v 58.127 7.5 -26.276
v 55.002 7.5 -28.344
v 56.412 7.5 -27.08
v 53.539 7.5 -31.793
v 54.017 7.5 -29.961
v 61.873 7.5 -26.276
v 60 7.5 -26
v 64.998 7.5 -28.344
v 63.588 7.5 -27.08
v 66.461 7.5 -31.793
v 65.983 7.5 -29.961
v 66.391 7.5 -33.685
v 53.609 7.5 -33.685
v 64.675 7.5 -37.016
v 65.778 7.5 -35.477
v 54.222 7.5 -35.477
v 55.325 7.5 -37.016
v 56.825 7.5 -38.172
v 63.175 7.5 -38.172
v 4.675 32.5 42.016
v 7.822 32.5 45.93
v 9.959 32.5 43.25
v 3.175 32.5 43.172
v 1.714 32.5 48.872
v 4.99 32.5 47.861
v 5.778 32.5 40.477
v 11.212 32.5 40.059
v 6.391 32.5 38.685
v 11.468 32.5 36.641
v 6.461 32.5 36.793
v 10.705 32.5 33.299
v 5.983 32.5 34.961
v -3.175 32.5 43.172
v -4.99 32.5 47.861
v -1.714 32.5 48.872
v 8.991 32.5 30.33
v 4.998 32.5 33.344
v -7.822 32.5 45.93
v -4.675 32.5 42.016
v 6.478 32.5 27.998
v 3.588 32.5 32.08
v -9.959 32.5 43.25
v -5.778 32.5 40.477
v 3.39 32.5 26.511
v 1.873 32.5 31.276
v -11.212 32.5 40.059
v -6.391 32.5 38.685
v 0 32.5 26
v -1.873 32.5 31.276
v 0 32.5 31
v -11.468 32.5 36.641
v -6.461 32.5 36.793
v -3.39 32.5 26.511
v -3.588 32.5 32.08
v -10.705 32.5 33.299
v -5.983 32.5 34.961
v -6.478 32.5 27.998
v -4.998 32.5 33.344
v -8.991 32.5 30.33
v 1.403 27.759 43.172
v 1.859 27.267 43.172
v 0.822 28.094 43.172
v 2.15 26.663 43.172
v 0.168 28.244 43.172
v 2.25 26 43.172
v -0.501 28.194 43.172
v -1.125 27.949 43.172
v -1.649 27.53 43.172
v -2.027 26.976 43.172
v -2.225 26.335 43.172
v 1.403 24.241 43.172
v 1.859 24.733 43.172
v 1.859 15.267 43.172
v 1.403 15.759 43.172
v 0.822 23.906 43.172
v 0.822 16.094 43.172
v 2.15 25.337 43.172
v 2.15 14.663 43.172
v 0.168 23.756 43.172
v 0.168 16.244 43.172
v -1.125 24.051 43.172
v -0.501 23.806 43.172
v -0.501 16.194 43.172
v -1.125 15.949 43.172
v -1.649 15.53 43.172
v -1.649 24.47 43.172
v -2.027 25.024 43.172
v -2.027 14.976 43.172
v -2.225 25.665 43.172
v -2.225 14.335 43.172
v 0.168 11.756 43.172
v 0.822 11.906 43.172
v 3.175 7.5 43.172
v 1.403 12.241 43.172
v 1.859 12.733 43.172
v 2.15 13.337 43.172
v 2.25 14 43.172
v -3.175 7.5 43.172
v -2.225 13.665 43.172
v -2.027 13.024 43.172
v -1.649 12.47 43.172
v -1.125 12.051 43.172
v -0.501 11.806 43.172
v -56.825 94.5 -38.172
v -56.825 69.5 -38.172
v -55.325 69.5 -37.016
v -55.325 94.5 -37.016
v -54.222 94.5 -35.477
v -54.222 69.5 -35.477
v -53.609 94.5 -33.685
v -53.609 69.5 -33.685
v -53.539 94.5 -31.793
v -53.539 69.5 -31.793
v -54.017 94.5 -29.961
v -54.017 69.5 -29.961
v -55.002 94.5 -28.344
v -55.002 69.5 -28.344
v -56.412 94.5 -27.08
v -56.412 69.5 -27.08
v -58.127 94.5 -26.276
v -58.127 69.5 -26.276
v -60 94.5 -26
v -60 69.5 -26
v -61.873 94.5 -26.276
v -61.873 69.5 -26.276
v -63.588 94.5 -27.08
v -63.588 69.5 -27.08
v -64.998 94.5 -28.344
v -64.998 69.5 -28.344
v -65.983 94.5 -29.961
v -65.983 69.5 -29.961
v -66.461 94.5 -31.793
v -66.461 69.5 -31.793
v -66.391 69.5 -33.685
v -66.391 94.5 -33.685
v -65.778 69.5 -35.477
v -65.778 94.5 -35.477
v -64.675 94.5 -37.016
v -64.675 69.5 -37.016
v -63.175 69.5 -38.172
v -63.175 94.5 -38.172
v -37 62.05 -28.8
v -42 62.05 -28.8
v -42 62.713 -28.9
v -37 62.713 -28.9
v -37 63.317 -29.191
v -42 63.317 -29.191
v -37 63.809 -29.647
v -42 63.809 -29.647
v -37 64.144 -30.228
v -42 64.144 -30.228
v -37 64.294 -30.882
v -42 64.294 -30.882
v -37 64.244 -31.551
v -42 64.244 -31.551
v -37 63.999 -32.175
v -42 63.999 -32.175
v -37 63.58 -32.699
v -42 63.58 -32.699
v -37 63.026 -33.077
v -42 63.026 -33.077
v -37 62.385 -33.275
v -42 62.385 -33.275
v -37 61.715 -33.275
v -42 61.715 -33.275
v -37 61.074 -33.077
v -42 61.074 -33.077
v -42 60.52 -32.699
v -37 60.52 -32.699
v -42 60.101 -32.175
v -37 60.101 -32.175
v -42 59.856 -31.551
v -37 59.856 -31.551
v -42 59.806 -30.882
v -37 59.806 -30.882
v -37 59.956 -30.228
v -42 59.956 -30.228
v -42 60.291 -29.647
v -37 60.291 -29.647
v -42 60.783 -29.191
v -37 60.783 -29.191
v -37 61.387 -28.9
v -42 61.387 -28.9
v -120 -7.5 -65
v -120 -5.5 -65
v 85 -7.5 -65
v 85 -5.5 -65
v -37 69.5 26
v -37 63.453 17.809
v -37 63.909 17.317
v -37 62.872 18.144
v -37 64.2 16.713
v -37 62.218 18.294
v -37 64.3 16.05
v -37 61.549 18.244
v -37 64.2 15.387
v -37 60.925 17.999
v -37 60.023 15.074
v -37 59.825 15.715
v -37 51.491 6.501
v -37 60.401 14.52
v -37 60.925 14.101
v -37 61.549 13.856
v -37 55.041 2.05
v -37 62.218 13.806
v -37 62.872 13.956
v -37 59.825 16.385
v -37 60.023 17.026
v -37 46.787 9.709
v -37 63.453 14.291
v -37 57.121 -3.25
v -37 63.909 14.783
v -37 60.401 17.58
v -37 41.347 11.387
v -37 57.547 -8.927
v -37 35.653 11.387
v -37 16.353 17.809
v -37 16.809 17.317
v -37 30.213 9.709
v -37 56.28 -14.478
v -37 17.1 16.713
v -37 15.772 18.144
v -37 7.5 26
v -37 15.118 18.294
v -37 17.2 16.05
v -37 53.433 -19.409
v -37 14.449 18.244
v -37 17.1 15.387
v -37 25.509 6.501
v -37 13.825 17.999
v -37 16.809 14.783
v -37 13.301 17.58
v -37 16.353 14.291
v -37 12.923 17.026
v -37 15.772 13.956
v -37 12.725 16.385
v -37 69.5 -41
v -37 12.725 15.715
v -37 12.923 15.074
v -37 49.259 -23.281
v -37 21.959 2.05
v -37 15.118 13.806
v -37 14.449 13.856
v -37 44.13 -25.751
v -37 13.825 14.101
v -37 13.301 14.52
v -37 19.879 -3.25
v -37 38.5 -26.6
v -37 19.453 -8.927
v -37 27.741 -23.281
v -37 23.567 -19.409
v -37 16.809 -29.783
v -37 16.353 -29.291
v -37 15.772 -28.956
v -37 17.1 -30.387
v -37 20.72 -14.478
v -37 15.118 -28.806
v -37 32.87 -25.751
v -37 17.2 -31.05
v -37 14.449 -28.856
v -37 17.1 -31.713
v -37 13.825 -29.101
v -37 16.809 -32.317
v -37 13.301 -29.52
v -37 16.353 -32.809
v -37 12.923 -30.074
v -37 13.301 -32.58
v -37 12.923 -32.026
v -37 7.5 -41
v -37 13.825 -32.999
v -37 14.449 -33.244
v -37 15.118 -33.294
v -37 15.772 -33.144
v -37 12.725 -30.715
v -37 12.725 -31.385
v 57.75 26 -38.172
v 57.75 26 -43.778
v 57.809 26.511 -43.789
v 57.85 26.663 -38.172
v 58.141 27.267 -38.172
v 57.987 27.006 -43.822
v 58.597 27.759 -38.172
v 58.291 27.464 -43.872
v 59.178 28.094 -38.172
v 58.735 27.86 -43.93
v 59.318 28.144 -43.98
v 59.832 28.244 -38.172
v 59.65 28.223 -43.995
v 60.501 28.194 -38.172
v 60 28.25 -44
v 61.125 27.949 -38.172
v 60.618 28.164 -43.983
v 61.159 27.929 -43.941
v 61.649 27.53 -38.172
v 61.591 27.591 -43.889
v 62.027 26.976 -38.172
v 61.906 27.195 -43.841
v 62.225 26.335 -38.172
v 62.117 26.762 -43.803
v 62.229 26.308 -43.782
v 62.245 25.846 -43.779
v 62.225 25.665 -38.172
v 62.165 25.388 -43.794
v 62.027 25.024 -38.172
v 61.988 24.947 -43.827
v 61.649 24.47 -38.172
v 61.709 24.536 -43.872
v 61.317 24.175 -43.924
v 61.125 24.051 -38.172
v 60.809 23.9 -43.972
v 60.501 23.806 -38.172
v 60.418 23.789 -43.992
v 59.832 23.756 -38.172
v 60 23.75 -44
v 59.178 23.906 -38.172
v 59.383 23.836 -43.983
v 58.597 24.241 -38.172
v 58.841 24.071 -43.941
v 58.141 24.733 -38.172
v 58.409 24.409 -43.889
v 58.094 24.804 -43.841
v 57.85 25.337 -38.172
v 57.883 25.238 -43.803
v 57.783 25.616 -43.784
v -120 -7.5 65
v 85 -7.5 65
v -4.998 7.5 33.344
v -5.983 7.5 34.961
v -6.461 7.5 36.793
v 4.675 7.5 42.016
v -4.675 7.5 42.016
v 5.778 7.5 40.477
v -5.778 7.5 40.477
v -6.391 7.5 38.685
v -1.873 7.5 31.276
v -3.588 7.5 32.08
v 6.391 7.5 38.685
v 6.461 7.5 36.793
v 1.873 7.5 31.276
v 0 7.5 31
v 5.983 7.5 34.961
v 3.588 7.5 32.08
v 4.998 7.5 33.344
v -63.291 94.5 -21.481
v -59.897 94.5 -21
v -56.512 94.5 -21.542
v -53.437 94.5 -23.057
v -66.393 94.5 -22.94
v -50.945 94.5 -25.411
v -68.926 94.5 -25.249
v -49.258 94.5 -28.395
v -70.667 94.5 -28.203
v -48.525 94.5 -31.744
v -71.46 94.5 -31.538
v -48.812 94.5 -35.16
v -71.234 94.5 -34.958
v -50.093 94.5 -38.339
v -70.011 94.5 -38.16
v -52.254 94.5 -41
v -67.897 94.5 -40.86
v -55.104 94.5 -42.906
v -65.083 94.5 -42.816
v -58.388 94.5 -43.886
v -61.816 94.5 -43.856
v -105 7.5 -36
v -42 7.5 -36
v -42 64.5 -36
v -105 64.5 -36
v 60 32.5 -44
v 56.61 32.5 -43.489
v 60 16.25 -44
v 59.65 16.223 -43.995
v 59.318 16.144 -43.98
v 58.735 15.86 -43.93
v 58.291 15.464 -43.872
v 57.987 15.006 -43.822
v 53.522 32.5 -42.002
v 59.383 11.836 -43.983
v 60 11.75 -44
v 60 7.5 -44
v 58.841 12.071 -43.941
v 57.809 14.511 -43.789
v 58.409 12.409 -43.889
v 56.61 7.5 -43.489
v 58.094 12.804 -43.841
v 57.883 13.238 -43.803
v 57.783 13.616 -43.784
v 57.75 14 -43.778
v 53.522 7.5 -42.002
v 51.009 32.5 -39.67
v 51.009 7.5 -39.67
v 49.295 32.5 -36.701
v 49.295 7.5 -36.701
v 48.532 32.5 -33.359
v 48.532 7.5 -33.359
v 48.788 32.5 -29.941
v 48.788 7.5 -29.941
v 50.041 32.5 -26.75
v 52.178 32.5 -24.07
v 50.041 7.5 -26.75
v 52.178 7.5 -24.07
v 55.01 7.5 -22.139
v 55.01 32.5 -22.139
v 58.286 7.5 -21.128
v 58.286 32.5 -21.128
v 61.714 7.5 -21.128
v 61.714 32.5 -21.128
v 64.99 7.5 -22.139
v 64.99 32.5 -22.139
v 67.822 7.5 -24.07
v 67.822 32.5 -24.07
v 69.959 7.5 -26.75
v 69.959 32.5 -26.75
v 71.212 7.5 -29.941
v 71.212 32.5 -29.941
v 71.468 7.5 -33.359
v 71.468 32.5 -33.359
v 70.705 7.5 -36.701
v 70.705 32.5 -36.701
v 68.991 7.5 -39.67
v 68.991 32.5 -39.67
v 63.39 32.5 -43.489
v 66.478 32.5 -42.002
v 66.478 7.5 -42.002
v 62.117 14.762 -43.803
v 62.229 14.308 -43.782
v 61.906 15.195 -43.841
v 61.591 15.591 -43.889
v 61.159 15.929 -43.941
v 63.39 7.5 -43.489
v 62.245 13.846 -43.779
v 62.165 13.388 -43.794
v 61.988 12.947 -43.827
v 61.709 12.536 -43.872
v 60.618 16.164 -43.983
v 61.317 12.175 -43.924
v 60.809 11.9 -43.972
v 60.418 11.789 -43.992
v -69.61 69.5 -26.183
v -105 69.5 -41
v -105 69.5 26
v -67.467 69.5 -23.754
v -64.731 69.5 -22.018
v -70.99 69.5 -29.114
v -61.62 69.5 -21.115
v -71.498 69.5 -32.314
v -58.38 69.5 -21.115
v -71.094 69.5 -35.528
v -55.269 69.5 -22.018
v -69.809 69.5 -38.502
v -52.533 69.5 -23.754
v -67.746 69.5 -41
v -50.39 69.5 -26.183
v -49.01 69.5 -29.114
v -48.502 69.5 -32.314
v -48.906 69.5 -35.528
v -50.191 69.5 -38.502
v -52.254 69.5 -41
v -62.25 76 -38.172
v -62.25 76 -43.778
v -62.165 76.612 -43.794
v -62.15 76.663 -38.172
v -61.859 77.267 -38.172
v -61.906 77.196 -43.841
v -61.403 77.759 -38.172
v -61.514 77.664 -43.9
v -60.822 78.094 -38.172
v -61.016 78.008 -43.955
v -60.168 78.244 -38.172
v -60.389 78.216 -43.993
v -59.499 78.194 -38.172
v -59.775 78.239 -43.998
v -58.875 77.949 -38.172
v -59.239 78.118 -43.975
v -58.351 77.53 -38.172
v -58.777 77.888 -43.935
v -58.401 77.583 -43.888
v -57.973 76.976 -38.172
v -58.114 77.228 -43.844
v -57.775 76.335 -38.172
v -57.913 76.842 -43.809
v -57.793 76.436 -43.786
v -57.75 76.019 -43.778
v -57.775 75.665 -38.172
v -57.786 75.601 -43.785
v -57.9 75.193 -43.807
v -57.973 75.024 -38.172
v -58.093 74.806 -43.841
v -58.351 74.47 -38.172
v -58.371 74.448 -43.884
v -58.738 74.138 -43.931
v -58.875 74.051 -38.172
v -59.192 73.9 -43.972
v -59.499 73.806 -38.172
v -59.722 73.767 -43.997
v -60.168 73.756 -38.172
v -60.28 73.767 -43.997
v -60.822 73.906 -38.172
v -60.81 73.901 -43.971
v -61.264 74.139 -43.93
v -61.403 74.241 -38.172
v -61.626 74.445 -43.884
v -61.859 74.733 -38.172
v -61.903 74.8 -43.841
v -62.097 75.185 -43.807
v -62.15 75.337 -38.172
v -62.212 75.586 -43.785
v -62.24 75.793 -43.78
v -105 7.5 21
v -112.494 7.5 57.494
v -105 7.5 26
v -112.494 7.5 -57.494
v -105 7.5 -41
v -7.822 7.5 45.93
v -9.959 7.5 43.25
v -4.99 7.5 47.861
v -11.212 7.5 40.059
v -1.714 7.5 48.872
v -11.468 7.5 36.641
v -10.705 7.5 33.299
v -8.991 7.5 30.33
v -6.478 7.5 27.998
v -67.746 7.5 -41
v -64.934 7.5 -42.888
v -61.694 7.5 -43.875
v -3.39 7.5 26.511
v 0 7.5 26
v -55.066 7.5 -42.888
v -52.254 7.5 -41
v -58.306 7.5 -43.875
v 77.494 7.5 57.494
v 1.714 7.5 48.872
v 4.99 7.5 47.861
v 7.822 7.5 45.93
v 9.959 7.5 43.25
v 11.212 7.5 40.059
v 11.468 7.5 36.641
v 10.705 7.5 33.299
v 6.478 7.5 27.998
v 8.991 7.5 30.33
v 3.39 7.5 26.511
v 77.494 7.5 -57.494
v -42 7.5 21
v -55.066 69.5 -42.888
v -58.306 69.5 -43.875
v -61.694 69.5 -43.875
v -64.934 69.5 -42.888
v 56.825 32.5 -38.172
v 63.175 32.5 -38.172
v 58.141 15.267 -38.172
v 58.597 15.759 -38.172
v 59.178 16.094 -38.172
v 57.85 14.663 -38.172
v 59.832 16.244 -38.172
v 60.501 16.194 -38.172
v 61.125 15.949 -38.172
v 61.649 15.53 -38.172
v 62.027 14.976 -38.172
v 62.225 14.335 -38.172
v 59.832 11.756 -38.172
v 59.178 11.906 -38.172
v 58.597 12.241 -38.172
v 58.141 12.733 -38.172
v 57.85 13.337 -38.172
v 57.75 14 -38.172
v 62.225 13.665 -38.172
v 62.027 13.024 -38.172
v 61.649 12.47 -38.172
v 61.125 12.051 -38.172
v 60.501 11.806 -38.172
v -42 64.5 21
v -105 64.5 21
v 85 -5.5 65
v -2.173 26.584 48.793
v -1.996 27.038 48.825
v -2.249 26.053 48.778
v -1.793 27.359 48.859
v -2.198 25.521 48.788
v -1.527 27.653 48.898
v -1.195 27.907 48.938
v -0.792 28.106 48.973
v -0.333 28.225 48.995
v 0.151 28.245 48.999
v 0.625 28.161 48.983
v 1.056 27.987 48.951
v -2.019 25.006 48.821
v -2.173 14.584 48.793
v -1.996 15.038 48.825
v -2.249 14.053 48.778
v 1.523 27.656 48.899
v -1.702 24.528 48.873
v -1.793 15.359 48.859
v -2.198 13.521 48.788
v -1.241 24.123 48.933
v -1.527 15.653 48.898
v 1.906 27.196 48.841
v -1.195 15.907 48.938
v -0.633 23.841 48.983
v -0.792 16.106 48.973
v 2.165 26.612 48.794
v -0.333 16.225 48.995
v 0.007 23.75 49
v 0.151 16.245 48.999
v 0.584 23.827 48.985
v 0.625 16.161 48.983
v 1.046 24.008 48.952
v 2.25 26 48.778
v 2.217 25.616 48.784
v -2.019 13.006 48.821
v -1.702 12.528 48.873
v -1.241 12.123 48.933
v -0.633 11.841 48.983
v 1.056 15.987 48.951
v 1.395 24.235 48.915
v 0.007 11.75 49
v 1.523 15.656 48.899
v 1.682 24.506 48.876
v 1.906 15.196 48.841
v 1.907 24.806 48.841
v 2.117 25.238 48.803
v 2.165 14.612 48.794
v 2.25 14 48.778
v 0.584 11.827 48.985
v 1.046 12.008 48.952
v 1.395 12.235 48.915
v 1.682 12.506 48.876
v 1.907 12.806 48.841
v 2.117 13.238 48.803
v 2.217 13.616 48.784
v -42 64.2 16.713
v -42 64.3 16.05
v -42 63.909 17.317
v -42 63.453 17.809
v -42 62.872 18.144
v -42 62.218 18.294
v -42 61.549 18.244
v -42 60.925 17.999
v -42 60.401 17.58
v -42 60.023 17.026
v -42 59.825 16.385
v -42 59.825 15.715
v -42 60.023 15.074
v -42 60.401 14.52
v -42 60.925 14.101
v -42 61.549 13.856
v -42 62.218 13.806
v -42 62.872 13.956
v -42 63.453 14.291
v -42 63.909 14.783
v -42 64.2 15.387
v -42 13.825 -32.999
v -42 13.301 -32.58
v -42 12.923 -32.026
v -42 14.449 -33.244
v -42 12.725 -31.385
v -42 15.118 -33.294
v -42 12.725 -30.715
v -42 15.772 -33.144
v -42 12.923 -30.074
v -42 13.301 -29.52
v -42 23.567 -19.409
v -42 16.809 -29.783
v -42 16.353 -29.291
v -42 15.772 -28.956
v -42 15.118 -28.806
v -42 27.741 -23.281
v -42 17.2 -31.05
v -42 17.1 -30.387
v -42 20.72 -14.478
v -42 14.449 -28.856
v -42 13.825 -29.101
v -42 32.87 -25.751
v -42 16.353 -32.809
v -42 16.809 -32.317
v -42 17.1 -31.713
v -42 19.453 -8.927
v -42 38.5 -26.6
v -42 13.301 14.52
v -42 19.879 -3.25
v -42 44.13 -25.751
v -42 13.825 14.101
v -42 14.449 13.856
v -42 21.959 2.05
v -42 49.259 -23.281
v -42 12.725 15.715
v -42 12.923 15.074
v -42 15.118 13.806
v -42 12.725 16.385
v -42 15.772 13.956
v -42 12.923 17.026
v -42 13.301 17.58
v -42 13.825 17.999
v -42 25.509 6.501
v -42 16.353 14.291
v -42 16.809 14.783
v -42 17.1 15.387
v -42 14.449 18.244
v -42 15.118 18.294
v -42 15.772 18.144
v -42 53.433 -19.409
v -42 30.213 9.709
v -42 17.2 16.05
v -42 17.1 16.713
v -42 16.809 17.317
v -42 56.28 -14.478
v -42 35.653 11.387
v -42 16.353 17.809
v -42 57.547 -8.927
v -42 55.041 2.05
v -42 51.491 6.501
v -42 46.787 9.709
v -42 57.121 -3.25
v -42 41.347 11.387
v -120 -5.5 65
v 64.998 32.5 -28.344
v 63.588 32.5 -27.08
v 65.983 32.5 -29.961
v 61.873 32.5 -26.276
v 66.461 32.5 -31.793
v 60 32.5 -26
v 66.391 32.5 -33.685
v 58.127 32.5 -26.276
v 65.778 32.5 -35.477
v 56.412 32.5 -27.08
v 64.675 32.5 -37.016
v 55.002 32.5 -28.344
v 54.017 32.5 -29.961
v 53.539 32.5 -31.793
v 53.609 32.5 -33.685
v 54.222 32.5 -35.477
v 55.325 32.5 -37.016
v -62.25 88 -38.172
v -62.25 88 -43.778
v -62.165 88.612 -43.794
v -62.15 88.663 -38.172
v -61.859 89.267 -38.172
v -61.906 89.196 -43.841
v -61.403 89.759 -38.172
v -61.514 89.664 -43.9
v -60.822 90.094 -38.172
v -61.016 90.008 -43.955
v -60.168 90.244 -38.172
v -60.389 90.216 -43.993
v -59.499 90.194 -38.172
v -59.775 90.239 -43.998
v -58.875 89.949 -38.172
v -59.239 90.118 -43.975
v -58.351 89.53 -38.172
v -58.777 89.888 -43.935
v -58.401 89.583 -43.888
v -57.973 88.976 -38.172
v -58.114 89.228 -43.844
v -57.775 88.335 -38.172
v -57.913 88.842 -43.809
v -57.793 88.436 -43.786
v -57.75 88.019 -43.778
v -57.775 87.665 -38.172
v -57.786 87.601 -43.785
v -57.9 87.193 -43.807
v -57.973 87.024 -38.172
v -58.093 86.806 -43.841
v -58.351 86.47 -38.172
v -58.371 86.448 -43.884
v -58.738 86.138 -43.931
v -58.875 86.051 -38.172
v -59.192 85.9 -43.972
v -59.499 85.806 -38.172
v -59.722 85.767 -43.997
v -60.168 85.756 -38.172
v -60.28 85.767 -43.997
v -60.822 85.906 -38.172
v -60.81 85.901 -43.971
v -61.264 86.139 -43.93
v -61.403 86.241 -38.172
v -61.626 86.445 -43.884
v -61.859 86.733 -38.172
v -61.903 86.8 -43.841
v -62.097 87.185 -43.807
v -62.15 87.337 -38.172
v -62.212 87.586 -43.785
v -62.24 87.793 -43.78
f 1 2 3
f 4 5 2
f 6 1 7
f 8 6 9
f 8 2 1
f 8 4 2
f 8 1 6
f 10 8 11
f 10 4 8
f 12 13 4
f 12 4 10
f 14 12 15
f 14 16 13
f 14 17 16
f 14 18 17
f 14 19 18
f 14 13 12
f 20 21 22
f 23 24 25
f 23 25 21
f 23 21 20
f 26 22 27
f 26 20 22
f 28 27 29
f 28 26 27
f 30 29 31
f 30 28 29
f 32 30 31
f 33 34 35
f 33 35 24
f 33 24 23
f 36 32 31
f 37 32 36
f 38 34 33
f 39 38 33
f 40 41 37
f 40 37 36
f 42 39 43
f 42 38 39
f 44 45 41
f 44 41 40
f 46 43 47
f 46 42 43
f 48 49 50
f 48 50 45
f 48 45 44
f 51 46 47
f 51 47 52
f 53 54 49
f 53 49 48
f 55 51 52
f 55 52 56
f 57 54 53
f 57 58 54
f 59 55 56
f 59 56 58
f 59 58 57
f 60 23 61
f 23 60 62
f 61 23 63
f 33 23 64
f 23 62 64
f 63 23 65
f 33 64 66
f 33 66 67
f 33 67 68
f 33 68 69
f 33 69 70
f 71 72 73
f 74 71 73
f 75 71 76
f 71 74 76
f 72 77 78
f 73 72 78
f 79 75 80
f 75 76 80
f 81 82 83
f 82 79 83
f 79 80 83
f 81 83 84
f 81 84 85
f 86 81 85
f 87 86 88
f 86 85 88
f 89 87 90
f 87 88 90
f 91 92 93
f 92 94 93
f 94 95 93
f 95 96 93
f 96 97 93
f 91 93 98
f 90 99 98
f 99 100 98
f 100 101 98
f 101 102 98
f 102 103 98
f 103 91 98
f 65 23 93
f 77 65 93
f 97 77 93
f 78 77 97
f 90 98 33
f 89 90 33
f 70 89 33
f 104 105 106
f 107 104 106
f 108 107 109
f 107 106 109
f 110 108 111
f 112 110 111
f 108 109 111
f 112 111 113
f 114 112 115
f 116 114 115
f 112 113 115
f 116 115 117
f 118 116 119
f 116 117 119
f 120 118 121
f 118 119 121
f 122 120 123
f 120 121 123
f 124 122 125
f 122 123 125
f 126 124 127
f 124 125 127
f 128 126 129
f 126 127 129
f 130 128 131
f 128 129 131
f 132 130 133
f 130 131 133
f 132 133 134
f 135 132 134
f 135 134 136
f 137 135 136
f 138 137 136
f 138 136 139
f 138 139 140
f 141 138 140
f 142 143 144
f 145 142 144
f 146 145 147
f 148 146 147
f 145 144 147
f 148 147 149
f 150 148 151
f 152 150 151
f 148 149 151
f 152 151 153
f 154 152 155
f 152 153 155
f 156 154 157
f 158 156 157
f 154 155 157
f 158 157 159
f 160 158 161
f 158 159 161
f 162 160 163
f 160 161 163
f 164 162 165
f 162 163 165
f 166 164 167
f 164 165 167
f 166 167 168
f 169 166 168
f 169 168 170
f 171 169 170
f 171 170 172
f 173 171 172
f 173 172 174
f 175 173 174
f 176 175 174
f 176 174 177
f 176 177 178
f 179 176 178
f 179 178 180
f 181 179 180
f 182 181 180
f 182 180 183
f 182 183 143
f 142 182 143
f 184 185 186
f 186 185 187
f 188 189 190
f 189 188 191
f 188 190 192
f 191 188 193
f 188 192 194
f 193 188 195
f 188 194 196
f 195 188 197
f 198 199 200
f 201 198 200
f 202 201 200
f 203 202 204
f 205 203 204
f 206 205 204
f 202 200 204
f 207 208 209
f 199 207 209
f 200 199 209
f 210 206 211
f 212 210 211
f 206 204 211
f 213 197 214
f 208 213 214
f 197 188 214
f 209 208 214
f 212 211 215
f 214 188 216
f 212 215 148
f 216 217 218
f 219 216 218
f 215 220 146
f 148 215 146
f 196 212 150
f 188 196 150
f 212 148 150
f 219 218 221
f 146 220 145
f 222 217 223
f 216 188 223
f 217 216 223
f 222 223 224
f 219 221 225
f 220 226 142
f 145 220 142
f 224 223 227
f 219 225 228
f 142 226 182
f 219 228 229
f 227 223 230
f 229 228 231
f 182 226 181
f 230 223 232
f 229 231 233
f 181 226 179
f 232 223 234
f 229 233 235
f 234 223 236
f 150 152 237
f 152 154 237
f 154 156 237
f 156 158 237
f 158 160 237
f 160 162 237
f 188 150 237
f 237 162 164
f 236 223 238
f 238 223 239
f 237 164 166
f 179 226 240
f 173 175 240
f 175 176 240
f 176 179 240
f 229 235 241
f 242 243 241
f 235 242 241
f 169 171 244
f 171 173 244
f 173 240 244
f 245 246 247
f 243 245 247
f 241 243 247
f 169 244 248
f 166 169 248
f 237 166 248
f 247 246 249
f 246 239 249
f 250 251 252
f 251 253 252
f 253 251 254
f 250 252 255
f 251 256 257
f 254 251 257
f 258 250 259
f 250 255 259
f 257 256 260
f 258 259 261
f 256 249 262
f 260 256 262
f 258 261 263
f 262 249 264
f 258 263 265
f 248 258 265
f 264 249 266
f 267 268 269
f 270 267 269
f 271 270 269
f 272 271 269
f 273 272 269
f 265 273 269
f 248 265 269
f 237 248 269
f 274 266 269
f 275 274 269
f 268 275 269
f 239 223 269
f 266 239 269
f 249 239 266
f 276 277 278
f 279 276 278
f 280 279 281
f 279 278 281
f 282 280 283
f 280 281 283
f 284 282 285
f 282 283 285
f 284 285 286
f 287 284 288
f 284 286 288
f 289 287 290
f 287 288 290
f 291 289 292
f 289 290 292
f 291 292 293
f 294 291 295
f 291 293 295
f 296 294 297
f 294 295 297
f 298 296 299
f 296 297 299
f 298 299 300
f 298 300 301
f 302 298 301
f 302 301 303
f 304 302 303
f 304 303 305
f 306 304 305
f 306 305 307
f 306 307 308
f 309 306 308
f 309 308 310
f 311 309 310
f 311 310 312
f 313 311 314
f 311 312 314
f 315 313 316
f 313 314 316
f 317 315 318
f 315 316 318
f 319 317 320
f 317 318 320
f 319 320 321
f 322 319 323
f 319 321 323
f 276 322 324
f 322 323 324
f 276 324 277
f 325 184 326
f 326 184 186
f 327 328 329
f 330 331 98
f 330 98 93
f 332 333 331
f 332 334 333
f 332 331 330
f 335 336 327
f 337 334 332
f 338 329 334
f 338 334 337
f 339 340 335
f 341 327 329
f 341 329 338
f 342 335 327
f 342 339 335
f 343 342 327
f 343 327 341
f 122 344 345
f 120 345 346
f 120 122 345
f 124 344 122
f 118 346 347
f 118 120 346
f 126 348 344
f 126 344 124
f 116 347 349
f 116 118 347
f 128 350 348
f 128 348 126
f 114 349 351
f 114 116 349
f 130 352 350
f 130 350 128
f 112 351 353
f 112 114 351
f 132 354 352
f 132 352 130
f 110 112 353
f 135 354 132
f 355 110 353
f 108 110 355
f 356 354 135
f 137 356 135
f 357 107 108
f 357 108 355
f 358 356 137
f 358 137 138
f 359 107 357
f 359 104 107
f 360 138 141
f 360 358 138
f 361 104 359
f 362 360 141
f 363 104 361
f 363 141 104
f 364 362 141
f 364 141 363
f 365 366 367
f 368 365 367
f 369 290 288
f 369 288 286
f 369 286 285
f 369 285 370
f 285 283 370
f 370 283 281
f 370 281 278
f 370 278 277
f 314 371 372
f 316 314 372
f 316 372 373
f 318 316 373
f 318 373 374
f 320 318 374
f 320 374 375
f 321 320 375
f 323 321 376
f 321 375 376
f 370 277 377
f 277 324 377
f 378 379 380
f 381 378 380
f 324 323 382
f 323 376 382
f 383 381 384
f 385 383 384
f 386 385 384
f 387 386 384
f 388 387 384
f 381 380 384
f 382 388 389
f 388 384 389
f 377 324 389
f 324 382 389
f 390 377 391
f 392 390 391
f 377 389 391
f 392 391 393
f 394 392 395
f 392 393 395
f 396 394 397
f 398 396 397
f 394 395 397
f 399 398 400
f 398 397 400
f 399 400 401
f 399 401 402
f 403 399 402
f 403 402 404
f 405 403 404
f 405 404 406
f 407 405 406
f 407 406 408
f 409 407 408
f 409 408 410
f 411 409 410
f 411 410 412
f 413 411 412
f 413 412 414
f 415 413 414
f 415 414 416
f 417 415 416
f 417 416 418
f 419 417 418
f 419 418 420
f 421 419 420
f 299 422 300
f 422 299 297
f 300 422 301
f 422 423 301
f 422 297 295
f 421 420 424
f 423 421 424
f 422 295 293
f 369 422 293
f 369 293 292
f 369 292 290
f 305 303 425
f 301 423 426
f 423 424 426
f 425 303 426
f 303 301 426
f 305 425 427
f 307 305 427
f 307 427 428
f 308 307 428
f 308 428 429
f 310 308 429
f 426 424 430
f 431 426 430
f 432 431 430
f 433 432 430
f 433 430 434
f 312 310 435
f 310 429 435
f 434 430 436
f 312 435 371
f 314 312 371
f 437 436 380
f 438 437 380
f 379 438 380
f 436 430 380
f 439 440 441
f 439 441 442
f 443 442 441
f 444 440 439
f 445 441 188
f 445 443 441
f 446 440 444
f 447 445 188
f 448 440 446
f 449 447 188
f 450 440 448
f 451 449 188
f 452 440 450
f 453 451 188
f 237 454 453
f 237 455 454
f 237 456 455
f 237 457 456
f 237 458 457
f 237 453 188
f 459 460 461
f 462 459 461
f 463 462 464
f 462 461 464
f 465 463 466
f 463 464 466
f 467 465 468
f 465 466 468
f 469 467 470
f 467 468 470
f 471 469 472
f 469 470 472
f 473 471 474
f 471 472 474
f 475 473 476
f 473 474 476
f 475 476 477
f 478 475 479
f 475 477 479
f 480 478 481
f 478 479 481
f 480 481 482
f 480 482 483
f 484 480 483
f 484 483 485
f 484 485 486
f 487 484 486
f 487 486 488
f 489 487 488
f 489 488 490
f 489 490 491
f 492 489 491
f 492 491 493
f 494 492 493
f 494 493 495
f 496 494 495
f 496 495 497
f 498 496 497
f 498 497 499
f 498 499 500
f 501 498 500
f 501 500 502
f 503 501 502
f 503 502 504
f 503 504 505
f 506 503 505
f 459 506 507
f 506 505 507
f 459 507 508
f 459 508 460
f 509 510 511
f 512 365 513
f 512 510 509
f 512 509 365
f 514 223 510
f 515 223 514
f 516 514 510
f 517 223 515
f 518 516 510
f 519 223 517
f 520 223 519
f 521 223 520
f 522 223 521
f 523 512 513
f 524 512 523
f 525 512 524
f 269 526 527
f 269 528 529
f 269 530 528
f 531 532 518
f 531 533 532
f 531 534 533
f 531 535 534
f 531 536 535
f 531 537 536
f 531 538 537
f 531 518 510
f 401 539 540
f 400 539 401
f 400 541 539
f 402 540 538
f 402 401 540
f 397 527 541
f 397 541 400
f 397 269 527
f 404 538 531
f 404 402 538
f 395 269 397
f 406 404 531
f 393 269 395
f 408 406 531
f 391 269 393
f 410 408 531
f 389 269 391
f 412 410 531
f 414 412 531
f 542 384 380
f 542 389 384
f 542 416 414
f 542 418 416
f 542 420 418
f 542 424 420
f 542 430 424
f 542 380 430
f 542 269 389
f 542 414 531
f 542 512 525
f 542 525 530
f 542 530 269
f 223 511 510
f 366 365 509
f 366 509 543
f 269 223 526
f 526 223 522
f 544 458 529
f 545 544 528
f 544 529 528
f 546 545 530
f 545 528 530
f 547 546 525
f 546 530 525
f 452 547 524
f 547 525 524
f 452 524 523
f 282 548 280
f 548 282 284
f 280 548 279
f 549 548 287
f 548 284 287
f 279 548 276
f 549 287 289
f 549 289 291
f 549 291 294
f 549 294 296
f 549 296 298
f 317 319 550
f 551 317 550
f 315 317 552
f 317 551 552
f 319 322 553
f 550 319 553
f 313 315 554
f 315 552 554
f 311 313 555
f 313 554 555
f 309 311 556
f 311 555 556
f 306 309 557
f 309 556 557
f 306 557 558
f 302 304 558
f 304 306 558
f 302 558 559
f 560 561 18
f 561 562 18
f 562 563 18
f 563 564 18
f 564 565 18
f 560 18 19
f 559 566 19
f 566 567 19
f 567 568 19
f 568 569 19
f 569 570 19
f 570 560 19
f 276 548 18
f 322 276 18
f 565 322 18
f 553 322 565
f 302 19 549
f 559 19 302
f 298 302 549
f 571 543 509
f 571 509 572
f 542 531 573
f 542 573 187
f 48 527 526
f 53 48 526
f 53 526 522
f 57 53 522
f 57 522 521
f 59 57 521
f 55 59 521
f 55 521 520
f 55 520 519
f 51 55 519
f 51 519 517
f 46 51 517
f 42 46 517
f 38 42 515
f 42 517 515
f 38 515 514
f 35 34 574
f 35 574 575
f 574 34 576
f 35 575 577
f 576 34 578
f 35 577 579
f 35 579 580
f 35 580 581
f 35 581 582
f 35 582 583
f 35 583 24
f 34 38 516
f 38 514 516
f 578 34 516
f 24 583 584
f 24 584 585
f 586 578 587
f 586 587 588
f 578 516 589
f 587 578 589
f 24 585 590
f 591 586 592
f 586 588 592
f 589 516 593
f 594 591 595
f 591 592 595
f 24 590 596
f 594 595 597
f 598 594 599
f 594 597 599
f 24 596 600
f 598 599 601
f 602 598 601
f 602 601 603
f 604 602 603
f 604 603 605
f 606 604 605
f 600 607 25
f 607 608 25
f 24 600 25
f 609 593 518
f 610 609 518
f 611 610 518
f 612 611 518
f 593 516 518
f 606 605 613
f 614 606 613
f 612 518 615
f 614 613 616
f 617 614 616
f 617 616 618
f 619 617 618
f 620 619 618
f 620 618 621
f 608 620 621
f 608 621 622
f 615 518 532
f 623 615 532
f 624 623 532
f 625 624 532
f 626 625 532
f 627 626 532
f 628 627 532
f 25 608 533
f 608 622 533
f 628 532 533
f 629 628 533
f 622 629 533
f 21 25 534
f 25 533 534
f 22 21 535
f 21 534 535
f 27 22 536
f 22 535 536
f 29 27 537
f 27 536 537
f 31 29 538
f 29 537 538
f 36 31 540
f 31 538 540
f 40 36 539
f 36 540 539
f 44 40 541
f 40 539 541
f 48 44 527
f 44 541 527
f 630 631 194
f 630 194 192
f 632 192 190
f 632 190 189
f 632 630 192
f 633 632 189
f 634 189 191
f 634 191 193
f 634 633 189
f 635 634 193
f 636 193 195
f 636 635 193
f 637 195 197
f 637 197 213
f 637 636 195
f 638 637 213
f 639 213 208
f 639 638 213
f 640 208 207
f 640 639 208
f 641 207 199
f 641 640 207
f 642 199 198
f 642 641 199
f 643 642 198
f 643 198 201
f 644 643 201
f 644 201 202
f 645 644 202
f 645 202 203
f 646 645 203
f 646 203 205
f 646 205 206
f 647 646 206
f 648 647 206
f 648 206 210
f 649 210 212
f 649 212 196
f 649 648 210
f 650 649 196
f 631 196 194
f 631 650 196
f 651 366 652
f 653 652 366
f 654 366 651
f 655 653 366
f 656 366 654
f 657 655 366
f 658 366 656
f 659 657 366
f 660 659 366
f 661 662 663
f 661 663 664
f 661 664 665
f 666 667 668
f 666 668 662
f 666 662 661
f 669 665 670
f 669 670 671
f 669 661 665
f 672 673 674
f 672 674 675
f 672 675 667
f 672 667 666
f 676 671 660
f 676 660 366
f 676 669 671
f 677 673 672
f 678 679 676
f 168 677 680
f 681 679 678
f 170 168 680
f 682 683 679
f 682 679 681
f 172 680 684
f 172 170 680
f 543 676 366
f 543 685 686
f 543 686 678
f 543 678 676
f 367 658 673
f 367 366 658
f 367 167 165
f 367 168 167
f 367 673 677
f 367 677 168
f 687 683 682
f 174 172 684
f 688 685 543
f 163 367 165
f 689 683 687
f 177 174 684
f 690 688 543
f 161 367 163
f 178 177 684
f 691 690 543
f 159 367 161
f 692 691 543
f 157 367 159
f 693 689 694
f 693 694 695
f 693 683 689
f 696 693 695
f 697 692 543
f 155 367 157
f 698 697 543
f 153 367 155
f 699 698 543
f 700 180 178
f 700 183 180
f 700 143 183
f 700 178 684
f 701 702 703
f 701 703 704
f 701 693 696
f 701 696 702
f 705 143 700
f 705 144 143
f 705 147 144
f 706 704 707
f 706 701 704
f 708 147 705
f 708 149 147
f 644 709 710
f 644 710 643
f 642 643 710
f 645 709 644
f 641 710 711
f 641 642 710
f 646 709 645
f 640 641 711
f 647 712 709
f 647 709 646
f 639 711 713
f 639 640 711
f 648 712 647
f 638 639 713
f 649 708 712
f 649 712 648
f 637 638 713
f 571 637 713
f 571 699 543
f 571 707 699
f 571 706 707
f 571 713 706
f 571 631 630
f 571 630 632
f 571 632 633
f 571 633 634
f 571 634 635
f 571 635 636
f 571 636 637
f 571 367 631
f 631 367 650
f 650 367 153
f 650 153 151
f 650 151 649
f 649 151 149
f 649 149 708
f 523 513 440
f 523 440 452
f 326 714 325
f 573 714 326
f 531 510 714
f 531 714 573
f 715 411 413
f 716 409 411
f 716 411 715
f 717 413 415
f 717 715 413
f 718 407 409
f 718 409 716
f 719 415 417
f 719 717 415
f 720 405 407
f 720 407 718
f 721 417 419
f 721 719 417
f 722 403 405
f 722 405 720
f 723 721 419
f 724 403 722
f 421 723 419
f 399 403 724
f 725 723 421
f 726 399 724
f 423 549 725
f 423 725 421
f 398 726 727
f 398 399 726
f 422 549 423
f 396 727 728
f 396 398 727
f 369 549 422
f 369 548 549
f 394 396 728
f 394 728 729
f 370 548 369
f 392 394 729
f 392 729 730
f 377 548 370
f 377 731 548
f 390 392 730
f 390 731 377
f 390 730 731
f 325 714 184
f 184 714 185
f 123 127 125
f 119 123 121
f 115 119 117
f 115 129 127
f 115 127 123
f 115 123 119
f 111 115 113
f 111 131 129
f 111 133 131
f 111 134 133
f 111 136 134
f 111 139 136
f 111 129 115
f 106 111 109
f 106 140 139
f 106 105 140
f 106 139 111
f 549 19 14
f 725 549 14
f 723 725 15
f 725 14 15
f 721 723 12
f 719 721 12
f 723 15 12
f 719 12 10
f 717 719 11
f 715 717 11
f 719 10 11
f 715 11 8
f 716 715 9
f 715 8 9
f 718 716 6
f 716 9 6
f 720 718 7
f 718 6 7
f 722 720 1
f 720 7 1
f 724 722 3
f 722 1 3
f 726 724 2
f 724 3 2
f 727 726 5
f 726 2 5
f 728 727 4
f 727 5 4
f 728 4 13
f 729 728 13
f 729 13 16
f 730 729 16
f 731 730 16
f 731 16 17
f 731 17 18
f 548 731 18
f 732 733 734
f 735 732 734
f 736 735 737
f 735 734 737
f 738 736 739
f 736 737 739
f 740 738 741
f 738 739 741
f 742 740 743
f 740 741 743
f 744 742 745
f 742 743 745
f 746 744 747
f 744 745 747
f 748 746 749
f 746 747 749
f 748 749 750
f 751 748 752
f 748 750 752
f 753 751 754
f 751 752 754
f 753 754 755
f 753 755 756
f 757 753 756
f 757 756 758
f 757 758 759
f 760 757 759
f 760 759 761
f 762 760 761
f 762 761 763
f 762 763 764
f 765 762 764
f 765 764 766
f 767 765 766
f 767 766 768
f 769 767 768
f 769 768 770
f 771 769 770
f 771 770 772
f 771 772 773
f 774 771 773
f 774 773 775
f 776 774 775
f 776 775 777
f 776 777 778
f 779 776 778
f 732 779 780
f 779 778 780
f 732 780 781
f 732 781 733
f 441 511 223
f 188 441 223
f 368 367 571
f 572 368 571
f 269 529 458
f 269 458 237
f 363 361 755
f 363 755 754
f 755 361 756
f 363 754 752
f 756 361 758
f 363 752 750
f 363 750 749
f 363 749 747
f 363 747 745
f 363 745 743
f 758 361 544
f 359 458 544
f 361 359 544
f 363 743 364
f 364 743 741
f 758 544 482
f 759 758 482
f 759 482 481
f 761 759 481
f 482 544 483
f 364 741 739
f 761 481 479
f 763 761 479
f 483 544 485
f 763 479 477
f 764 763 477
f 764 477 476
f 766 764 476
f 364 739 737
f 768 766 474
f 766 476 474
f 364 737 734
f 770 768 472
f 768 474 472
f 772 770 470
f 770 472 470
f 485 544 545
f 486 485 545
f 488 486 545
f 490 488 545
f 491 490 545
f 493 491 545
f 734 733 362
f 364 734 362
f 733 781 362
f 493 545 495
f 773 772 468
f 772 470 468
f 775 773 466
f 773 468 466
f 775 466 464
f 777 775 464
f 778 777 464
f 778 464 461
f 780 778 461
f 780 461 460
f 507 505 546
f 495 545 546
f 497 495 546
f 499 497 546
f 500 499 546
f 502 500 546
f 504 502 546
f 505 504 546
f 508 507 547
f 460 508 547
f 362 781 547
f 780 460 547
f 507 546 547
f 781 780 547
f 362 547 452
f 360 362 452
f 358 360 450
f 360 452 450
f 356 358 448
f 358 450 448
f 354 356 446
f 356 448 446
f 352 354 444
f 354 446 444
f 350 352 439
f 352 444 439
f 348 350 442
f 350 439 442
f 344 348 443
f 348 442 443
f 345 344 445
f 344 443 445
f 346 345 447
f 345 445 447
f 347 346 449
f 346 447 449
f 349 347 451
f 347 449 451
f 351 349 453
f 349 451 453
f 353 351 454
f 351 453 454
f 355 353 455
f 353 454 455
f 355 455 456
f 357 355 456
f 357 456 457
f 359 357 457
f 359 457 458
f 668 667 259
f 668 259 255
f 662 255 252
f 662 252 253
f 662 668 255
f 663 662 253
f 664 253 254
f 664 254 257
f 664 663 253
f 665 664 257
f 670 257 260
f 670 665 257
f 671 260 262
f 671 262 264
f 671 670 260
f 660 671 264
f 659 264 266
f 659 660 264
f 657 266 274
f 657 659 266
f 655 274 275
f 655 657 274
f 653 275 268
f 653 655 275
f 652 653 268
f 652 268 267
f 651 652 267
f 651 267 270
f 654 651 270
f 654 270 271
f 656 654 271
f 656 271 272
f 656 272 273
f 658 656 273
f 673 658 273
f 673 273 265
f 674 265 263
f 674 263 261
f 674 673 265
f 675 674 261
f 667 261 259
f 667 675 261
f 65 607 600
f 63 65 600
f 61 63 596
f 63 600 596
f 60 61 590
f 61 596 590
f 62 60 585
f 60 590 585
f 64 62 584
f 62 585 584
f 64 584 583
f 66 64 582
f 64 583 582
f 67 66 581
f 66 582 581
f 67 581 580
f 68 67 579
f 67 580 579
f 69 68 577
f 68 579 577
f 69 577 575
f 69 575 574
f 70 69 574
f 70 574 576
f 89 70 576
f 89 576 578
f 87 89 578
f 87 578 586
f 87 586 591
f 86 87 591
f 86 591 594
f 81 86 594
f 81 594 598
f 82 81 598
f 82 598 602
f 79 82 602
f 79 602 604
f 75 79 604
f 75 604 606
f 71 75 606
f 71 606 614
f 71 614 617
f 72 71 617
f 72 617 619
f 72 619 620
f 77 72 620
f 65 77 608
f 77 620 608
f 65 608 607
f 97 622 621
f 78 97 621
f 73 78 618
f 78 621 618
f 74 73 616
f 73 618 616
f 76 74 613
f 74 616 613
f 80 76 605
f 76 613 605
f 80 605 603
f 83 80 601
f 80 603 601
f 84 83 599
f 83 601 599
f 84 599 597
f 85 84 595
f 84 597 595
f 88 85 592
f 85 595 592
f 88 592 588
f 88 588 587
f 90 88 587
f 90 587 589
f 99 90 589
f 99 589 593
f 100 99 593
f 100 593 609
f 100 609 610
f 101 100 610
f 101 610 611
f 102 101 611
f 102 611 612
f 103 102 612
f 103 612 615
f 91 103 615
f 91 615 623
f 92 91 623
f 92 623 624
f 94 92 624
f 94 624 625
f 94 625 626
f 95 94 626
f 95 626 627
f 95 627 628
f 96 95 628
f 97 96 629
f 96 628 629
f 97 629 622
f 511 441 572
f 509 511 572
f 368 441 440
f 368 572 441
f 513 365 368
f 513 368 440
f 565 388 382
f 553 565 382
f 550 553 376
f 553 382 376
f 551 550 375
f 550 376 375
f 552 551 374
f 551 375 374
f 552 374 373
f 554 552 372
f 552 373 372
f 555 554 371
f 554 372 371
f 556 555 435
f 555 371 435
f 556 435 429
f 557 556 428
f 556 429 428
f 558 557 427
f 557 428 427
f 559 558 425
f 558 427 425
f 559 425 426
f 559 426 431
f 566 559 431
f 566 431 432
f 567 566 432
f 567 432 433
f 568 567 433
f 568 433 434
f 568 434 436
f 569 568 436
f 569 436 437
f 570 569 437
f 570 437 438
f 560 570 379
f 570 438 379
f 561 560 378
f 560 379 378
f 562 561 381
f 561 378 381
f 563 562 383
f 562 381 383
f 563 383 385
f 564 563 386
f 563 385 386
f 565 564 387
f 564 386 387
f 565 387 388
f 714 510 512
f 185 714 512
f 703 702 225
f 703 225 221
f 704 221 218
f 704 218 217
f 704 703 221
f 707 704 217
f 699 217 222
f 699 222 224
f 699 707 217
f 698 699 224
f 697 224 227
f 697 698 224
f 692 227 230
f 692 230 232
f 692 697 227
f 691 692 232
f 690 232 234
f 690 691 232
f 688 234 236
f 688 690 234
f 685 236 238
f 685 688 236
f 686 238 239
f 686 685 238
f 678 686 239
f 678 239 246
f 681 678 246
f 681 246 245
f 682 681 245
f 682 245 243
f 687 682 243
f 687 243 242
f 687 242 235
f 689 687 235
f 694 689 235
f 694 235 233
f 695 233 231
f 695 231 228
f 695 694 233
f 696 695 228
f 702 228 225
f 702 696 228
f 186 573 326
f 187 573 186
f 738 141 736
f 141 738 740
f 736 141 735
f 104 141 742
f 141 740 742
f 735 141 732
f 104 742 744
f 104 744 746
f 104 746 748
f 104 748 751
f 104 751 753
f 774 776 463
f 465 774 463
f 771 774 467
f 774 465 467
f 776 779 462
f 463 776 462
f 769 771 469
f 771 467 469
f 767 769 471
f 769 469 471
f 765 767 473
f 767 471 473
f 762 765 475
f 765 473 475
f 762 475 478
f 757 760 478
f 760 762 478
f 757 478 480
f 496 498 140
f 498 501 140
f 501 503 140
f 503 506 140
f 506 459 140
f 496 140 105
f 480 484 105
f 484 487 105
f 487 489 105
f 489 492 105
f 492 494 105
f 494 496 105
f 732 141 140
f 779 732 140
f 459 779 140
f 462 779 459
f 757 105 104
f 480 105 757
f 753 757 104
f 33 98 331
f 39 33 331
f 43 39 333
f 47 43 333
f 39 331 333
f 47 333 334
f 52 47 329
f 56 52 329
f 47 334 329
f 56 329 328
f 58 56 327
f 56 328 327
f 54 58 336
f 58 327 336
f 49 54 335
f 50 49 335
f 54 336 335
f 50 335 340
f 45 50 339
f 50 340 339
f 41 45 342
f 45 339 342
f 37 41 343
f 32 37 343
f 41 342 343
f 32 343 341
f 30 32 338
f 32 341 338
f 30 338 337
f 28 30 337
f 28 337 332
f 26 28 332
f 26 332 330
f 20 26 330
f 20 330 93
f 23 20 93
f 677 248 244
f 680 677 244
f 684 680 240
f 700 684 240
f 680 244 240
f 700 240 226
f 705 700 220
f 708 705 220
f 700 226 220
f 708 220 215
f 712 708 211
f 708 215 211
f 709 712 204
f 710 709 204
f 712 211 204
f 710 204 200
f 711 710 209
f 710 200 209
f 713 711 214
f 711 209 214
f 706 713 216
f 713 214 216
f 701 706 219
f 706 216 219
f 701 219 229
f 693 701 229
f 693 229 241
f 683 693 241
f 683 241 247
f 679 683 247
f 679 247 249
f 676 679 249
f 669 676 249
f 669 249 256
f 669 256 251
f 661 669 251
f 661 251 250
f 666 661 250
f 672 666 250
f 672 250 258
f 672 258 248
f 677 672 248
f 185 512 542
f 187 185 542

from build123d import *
from OCP.BRepFilletAPI import BRepFilletAPI_MakeChamfer

# Parameters (mm, degrees)
SKETCH1_W                      = 205
SKETCH1_H                      = 130
BOSS_EXTRUDE1_DEPTH            = 7.5
CHAMFER1_SIZE                  = 13
CHAMFER1_SIZE2                 = 7.505553499
SKETCH3_W                      = 68
SKETCH3_H                      = 67
BOSS_EXTRUDE2_DEPTH            = 62
CUT_EXTRUDE4_DEPTH             = 10
CUT_EXTRUDE4_DEPTH_BACK        = 63
SKETCH8_W                      = 57
SKETCH8_H                      = 57
SKETCH5_R                      = 11.5
SHAFT_1_DEPTH                  = 25
F_4_5_4_5_DIAMETER_HOLE1_D     = 4.5
F_4_5_4_5_DIAMETER_HOLE1_DEPTH = 5.829194732
SKETCH9_R                      = 11.5
SHAFT_2_DEPTH                  = 25
SUPPORT_START                  = 7.5
SUPPORT_STRUCTURE_DEPTH        = 62
F_4_5_4_5_DIAMETER_HOLE2_D     = 4.5
F_4_5_4_5_DIAMETER_HOLE2_DEPTH = 5.829194732
SKETCH15_R                     = 11.5
SHAFT_3_DEPTH                  = 25
F_4_5_4_5_DIAMETER_HOLE3_D     = 4.5
F_4_5_4_5_DIAMETER_HOLE3_DEPTH = 5.829194732
CUT_EXTRUDE3_REACH             = 169.449
SKETCH18_R                     = 19.1
F_4_5_4_5_DIAMETER_HOLE4_D     = 4.5
CIRPATTERN1_START              = -42
CIRPATTERN1_OUTLINE_R          = 2.25
CIRPATTERN1_DEPTH              = 5
LPATTERN1_COUNT                = 2
LPATTERN1_PITCH                = 12


# Read off the part's stored shape, not the designer's step: Support Structure, CirPattern1
with BuildPart() as part:
    # Sketch1 → Boss-Extrude1 (new, symmetric)
    with BuildSketch(Plane(origin=(0, 0, 0), x_dir=(1, 0, 0), z_dir=(0, 1, 0))):
        with Locations((-17.5, 0)):
            Rectangle(SKETCH1_W, SKETCH1_H)
    extrude(amount=BOSS_EXTRUDE1_DEPTH, both=True)

    # Chamfer1: one chamfer whose edges measure the first distance from different faces: ONE call of the kernel's chamfer builder (chamfer() names one face for all edges)
    chamfer1_edges_1 = [part.edges().sort_by_distance(p)[0] for p in [
        (-120, 7.5, 0),
    ]]
    chamfer1_side_1 = [part.faces().sort_by_distance(p)[0] for p in [
        (-120, 0, 0),
    ]]
    chamfer1_edges_2 = [part.edges().sort_by_distance(p)[0] for p in [
        (-17.5, 7.5, 65),
    ]]
    chamfer1_side_2 = [part.faces().sort_by_distance(p)[0] for p in [
        (-17.5, 0, 65),
    ]]
    chamfer1_edges_3 = [part.edges().sort_by_distance(p)[0] for p in [
        (85, 7.5, 0),
    ]]
    chamfer1_side_3 = [part.faces().sort_by_distance(p)[0] for p in [
        (85, 0, 0),
    ]]
    chamfer1_edges_4 = [part.edges().sort_by_distance(p)[0] for p in [
        (-17.5, 7.5, -65),
    ]]
    chamfer1_side_4 = [part.faces().sort_by_distance(p)[0] for p in [
        (-17.5, 0, -65),
    ]]
    chamfer1 = BRepFilletAPI_MakeChamfer(part.part.solid().wrapped)
    for e in chamfer1_edges_1:
        chamfer1.Add(CHAMFER1_SIZE, CHAMFER1_SIZE2, e.wrapped, chamfer1_side_1[0].wrapped)  # the first distance lies on this face
    for e in chamfer1_edges_2:
        chamfer1.Add(CHAMFER1_SIZE, CHAMFER1_SIZE2, e.wrapped, chamfer1_side_2[0].wrapped)  # the first distance lies on this face
    for e in chamfer1_edges_3:
        chamfer1.Add(CHAMFER1_SIZE, CHAMFER1_SIZE2, e.wrapped, chamfer1_side_3[0].wrapped)  # the first distance lies on this face
    for e in chamfer1_edges_4:
        chamfer1.Add(CHAMFER1_SIZE, CHAMFER1_SIZE2, e.wrapped, chamfer1_side_4[0].wrapped)  # the first distance lies on this face
    add(Compound.cast(chamfer1.Shape()), mode=Mode.REPLACE)

    # Sketch3 → Boss-Extrude2 (add)
    with BuildSketch(Plane(origin=(0, 7.5, 0), x_dir=(1, 0, 0), z_dir=(0, 1, 0))):
        with Locations((-71, 7.5)):
            Rectangle(SKETCH3_W, SKETCH3_H)
    extrude(amount=BOSS_EXTRUDE2_DEPTH)

    # Sketch8 → Cut-Extrude4 (cut, two sides: drawn at the far end of the back side and taken through both)
    with BuildSketch(Plane.ZY.offset(105).offset(-CUT_EXTRUDE4_DEPTH_BACK)):
        with Locations((-7.5, 36)):
            Rectangle(SKETCH8_W, SKETCH8_H)
    extrude(amount=CUT_EXTRUDE4_DEPTH + CUT_EXTRUDE4_DEPTH_BACK, mode=Mode.SUBTRACT)

    # Sketch5 → Shaft 1 (add)
    with BuildSketch(Plane(origin=(0, 7.5, 0), x_dir=(1, 0, 0), z_dir=(0, 1, 0))):
        with Locations(Location((60, 32.5, 0), (0, 0, 90))):
            Circle(SKETCH5_R)
        with BuildLine():
            Line((56.825, 38.171805268), (63.175, 38.171805268))
            ThreePointArc((63.175, 38.171805268), (60, 26), (56.825, 38.171805268))
        make_face(mode=Mode.SUBTRACT)
    extrude(amount=SHAFT_1_DEPTH)

    # Ø4.5 (4.5) Diameter Hole1
    with Locations(Plane.XY.offset(-38.171805268)):
        with Locations((60, 26)):
            f_4_5_4_5_diameter_hole1 = Hole(F_4_5_4_5_DIAMETER_HOLE1_D / 2, depth=F_4_5_4_5_DIAMETER_HOLE1_DEPTH)

    # Sketch9 → Shaft 2 (add)
    with BuildSketch(Plane(origin=(0, 69.5, 0), x_dir=(1, 0, 0), z_dir=(0, 1, 0))):
        with Locations(Location((-60, 32.5, 0), (0, 0, 47.657394548))):
            Circle(SKETCH9_R)
        with BuildLine():
            Line((-63.175, 38.171805268), (-56.825, 38.171805268))
            ThreePointArc((-56.825, 38.171805268), (-60, 26), (-63.175, 38.171805268))
        make_face(mode=Mode.SUBTRACT)
    extrude(amount=SHAFT_2_DEPTH)

    # Support Structure outline → Support Structure (add)
    with BuildSketch(Plane(origin=(0, 0, 0), x_dir=(1, 0, 0), z_dir=(0, 1, 0)).offset(SUPPORT_START)):
        with BuildLine():
            Line((-67.745966692, 41), (-52.254033308, 41))
            ThreePointArc((-52.254033308, 41), (-60, 44), (-67.745966692, 41))
        make_face()
    extrude(amount=SUPPORT_STRUCTURE_DEPTH)

    # Ø4.5 (4.5) Diameter Hole2
    with Locations(Plane.XY.offset(-38.171805268)):
        with Locations((-60, 88)):
            f_4_5_4_5_diameter_hole2 = Hole(F_4_5_4_5_DIAMETER_HOLE2_D / 2, depth=F_4_5_4_5_DIAMETER_HOLE2_DEPTH)

    # Sketch15 → Shaft 3 (add)
    with BuildSketch(Plane(origin=(0, 7.5, 0), x_dir=(1, 0, 0), z_dir=(0, 1, 0))):
        with Locations(Location((0, -37.5, 0), (0, 0, 90))):
            Circle(SKETCH15_R)
        with BuildLine():
            Line((3.175, -43.171805268), (-3.175, -43.171805268))
            ThreePointArc((-3.175, -43.171805268), (0, -31), (3.175, -43.171805268))
        make_face(mode=Mode.SUBTRACT)
    extrude(amount=SHAFT_3_DEPTH)

    # Ø4.5 (4.5) Diameter Hole3
    with Locations(Plane(origin=(0, 0, 43.171805268), x_dir=(-1, 0, 0), z_dir=(0, 0, -1))):
        with Locations((0, 26)):
            f_4_5_4_5_diameter_hole3 = Hole(F_4_5_4_5_DIAMETER_HOLE3_D / 2, depth=F_4_5_4_5_DIAMETER_HOLE3_DEPTH)

    # Sketch18 → Cut-Extrude3 (cut, up to next)
    with BuildSketch(Plane(origin=(-37, 0, 0), x_dir=(0, 0, -1), z_dir=(1, 0, 0)), mode=Mode.PRIVATE) as cut_extrude3_sk1:
        with Locations((7.5, 38.5)):
            Circle(SKETCH18_R)
    cut_extrude3_tool1 = extrude(cut_extrude3_sk1.sketch, amount=-CUT_EXTRUDE3_REACH, mode=Mode.PRIVATE) & part.part
    add(cut_extrude3_tool1.solids().sort_by_distance((-37, 38.5, -7.5))[0], mode=Mode.SUBTRACT)

    # Ø4.5 (4.5) Diameter Hole4 (through all)
    with Locations(Plane(origin=(-37, 0, 0), x_dir=(0, 0, -1), z_dir=(1, 0, 0))):
        with Locations((31.05, 62.05)):
            Hole(F_4_5_4_5_DIAMETER_HOLE4_D / 2)

    # CirPattern1 outline → CirPattern1 (cut)
    with BuildSketch(Plane.YZ.offset(CIRPATTERN1_START)):
        with Locations((62.05, 16.05)):
            Circle(CIRPATTERN1_OUTLINE_R)
        with Locations((14.95, 16.05)):
            Circle(CIRPATTERN1_OUTLINE_R)
        with Locations((14.95, -31.05)):
            Circle(CIRPATTERN1_OUTLINE_R)
    extrude(amount=CIRPATTERN1_DEPTH, mode=Mode.SUBTRACT)

    # LPattern1: Ø4.5 (4.5) Diameter Hole1, Ø4.5 (4.5) Diameter Hole2, Ø4.5 (4.5) Diameter Hole3 ×2
    with Locations(*[(0, -i * LPATTERN1_PITCH, 0) for i in range(1, LPATTERN1_COUNT)]):
        add(f_4_5_4_5_diameter_hole1, mode=Mode.SUBTRACT)
        add(f_4_5_4_5_diameter_hole2, mode=Mode.SUBTRACT)
        add(f_4_5_4_5_diameter_hole3, mode=Mode.SUBTRACT)


solid = part.part
